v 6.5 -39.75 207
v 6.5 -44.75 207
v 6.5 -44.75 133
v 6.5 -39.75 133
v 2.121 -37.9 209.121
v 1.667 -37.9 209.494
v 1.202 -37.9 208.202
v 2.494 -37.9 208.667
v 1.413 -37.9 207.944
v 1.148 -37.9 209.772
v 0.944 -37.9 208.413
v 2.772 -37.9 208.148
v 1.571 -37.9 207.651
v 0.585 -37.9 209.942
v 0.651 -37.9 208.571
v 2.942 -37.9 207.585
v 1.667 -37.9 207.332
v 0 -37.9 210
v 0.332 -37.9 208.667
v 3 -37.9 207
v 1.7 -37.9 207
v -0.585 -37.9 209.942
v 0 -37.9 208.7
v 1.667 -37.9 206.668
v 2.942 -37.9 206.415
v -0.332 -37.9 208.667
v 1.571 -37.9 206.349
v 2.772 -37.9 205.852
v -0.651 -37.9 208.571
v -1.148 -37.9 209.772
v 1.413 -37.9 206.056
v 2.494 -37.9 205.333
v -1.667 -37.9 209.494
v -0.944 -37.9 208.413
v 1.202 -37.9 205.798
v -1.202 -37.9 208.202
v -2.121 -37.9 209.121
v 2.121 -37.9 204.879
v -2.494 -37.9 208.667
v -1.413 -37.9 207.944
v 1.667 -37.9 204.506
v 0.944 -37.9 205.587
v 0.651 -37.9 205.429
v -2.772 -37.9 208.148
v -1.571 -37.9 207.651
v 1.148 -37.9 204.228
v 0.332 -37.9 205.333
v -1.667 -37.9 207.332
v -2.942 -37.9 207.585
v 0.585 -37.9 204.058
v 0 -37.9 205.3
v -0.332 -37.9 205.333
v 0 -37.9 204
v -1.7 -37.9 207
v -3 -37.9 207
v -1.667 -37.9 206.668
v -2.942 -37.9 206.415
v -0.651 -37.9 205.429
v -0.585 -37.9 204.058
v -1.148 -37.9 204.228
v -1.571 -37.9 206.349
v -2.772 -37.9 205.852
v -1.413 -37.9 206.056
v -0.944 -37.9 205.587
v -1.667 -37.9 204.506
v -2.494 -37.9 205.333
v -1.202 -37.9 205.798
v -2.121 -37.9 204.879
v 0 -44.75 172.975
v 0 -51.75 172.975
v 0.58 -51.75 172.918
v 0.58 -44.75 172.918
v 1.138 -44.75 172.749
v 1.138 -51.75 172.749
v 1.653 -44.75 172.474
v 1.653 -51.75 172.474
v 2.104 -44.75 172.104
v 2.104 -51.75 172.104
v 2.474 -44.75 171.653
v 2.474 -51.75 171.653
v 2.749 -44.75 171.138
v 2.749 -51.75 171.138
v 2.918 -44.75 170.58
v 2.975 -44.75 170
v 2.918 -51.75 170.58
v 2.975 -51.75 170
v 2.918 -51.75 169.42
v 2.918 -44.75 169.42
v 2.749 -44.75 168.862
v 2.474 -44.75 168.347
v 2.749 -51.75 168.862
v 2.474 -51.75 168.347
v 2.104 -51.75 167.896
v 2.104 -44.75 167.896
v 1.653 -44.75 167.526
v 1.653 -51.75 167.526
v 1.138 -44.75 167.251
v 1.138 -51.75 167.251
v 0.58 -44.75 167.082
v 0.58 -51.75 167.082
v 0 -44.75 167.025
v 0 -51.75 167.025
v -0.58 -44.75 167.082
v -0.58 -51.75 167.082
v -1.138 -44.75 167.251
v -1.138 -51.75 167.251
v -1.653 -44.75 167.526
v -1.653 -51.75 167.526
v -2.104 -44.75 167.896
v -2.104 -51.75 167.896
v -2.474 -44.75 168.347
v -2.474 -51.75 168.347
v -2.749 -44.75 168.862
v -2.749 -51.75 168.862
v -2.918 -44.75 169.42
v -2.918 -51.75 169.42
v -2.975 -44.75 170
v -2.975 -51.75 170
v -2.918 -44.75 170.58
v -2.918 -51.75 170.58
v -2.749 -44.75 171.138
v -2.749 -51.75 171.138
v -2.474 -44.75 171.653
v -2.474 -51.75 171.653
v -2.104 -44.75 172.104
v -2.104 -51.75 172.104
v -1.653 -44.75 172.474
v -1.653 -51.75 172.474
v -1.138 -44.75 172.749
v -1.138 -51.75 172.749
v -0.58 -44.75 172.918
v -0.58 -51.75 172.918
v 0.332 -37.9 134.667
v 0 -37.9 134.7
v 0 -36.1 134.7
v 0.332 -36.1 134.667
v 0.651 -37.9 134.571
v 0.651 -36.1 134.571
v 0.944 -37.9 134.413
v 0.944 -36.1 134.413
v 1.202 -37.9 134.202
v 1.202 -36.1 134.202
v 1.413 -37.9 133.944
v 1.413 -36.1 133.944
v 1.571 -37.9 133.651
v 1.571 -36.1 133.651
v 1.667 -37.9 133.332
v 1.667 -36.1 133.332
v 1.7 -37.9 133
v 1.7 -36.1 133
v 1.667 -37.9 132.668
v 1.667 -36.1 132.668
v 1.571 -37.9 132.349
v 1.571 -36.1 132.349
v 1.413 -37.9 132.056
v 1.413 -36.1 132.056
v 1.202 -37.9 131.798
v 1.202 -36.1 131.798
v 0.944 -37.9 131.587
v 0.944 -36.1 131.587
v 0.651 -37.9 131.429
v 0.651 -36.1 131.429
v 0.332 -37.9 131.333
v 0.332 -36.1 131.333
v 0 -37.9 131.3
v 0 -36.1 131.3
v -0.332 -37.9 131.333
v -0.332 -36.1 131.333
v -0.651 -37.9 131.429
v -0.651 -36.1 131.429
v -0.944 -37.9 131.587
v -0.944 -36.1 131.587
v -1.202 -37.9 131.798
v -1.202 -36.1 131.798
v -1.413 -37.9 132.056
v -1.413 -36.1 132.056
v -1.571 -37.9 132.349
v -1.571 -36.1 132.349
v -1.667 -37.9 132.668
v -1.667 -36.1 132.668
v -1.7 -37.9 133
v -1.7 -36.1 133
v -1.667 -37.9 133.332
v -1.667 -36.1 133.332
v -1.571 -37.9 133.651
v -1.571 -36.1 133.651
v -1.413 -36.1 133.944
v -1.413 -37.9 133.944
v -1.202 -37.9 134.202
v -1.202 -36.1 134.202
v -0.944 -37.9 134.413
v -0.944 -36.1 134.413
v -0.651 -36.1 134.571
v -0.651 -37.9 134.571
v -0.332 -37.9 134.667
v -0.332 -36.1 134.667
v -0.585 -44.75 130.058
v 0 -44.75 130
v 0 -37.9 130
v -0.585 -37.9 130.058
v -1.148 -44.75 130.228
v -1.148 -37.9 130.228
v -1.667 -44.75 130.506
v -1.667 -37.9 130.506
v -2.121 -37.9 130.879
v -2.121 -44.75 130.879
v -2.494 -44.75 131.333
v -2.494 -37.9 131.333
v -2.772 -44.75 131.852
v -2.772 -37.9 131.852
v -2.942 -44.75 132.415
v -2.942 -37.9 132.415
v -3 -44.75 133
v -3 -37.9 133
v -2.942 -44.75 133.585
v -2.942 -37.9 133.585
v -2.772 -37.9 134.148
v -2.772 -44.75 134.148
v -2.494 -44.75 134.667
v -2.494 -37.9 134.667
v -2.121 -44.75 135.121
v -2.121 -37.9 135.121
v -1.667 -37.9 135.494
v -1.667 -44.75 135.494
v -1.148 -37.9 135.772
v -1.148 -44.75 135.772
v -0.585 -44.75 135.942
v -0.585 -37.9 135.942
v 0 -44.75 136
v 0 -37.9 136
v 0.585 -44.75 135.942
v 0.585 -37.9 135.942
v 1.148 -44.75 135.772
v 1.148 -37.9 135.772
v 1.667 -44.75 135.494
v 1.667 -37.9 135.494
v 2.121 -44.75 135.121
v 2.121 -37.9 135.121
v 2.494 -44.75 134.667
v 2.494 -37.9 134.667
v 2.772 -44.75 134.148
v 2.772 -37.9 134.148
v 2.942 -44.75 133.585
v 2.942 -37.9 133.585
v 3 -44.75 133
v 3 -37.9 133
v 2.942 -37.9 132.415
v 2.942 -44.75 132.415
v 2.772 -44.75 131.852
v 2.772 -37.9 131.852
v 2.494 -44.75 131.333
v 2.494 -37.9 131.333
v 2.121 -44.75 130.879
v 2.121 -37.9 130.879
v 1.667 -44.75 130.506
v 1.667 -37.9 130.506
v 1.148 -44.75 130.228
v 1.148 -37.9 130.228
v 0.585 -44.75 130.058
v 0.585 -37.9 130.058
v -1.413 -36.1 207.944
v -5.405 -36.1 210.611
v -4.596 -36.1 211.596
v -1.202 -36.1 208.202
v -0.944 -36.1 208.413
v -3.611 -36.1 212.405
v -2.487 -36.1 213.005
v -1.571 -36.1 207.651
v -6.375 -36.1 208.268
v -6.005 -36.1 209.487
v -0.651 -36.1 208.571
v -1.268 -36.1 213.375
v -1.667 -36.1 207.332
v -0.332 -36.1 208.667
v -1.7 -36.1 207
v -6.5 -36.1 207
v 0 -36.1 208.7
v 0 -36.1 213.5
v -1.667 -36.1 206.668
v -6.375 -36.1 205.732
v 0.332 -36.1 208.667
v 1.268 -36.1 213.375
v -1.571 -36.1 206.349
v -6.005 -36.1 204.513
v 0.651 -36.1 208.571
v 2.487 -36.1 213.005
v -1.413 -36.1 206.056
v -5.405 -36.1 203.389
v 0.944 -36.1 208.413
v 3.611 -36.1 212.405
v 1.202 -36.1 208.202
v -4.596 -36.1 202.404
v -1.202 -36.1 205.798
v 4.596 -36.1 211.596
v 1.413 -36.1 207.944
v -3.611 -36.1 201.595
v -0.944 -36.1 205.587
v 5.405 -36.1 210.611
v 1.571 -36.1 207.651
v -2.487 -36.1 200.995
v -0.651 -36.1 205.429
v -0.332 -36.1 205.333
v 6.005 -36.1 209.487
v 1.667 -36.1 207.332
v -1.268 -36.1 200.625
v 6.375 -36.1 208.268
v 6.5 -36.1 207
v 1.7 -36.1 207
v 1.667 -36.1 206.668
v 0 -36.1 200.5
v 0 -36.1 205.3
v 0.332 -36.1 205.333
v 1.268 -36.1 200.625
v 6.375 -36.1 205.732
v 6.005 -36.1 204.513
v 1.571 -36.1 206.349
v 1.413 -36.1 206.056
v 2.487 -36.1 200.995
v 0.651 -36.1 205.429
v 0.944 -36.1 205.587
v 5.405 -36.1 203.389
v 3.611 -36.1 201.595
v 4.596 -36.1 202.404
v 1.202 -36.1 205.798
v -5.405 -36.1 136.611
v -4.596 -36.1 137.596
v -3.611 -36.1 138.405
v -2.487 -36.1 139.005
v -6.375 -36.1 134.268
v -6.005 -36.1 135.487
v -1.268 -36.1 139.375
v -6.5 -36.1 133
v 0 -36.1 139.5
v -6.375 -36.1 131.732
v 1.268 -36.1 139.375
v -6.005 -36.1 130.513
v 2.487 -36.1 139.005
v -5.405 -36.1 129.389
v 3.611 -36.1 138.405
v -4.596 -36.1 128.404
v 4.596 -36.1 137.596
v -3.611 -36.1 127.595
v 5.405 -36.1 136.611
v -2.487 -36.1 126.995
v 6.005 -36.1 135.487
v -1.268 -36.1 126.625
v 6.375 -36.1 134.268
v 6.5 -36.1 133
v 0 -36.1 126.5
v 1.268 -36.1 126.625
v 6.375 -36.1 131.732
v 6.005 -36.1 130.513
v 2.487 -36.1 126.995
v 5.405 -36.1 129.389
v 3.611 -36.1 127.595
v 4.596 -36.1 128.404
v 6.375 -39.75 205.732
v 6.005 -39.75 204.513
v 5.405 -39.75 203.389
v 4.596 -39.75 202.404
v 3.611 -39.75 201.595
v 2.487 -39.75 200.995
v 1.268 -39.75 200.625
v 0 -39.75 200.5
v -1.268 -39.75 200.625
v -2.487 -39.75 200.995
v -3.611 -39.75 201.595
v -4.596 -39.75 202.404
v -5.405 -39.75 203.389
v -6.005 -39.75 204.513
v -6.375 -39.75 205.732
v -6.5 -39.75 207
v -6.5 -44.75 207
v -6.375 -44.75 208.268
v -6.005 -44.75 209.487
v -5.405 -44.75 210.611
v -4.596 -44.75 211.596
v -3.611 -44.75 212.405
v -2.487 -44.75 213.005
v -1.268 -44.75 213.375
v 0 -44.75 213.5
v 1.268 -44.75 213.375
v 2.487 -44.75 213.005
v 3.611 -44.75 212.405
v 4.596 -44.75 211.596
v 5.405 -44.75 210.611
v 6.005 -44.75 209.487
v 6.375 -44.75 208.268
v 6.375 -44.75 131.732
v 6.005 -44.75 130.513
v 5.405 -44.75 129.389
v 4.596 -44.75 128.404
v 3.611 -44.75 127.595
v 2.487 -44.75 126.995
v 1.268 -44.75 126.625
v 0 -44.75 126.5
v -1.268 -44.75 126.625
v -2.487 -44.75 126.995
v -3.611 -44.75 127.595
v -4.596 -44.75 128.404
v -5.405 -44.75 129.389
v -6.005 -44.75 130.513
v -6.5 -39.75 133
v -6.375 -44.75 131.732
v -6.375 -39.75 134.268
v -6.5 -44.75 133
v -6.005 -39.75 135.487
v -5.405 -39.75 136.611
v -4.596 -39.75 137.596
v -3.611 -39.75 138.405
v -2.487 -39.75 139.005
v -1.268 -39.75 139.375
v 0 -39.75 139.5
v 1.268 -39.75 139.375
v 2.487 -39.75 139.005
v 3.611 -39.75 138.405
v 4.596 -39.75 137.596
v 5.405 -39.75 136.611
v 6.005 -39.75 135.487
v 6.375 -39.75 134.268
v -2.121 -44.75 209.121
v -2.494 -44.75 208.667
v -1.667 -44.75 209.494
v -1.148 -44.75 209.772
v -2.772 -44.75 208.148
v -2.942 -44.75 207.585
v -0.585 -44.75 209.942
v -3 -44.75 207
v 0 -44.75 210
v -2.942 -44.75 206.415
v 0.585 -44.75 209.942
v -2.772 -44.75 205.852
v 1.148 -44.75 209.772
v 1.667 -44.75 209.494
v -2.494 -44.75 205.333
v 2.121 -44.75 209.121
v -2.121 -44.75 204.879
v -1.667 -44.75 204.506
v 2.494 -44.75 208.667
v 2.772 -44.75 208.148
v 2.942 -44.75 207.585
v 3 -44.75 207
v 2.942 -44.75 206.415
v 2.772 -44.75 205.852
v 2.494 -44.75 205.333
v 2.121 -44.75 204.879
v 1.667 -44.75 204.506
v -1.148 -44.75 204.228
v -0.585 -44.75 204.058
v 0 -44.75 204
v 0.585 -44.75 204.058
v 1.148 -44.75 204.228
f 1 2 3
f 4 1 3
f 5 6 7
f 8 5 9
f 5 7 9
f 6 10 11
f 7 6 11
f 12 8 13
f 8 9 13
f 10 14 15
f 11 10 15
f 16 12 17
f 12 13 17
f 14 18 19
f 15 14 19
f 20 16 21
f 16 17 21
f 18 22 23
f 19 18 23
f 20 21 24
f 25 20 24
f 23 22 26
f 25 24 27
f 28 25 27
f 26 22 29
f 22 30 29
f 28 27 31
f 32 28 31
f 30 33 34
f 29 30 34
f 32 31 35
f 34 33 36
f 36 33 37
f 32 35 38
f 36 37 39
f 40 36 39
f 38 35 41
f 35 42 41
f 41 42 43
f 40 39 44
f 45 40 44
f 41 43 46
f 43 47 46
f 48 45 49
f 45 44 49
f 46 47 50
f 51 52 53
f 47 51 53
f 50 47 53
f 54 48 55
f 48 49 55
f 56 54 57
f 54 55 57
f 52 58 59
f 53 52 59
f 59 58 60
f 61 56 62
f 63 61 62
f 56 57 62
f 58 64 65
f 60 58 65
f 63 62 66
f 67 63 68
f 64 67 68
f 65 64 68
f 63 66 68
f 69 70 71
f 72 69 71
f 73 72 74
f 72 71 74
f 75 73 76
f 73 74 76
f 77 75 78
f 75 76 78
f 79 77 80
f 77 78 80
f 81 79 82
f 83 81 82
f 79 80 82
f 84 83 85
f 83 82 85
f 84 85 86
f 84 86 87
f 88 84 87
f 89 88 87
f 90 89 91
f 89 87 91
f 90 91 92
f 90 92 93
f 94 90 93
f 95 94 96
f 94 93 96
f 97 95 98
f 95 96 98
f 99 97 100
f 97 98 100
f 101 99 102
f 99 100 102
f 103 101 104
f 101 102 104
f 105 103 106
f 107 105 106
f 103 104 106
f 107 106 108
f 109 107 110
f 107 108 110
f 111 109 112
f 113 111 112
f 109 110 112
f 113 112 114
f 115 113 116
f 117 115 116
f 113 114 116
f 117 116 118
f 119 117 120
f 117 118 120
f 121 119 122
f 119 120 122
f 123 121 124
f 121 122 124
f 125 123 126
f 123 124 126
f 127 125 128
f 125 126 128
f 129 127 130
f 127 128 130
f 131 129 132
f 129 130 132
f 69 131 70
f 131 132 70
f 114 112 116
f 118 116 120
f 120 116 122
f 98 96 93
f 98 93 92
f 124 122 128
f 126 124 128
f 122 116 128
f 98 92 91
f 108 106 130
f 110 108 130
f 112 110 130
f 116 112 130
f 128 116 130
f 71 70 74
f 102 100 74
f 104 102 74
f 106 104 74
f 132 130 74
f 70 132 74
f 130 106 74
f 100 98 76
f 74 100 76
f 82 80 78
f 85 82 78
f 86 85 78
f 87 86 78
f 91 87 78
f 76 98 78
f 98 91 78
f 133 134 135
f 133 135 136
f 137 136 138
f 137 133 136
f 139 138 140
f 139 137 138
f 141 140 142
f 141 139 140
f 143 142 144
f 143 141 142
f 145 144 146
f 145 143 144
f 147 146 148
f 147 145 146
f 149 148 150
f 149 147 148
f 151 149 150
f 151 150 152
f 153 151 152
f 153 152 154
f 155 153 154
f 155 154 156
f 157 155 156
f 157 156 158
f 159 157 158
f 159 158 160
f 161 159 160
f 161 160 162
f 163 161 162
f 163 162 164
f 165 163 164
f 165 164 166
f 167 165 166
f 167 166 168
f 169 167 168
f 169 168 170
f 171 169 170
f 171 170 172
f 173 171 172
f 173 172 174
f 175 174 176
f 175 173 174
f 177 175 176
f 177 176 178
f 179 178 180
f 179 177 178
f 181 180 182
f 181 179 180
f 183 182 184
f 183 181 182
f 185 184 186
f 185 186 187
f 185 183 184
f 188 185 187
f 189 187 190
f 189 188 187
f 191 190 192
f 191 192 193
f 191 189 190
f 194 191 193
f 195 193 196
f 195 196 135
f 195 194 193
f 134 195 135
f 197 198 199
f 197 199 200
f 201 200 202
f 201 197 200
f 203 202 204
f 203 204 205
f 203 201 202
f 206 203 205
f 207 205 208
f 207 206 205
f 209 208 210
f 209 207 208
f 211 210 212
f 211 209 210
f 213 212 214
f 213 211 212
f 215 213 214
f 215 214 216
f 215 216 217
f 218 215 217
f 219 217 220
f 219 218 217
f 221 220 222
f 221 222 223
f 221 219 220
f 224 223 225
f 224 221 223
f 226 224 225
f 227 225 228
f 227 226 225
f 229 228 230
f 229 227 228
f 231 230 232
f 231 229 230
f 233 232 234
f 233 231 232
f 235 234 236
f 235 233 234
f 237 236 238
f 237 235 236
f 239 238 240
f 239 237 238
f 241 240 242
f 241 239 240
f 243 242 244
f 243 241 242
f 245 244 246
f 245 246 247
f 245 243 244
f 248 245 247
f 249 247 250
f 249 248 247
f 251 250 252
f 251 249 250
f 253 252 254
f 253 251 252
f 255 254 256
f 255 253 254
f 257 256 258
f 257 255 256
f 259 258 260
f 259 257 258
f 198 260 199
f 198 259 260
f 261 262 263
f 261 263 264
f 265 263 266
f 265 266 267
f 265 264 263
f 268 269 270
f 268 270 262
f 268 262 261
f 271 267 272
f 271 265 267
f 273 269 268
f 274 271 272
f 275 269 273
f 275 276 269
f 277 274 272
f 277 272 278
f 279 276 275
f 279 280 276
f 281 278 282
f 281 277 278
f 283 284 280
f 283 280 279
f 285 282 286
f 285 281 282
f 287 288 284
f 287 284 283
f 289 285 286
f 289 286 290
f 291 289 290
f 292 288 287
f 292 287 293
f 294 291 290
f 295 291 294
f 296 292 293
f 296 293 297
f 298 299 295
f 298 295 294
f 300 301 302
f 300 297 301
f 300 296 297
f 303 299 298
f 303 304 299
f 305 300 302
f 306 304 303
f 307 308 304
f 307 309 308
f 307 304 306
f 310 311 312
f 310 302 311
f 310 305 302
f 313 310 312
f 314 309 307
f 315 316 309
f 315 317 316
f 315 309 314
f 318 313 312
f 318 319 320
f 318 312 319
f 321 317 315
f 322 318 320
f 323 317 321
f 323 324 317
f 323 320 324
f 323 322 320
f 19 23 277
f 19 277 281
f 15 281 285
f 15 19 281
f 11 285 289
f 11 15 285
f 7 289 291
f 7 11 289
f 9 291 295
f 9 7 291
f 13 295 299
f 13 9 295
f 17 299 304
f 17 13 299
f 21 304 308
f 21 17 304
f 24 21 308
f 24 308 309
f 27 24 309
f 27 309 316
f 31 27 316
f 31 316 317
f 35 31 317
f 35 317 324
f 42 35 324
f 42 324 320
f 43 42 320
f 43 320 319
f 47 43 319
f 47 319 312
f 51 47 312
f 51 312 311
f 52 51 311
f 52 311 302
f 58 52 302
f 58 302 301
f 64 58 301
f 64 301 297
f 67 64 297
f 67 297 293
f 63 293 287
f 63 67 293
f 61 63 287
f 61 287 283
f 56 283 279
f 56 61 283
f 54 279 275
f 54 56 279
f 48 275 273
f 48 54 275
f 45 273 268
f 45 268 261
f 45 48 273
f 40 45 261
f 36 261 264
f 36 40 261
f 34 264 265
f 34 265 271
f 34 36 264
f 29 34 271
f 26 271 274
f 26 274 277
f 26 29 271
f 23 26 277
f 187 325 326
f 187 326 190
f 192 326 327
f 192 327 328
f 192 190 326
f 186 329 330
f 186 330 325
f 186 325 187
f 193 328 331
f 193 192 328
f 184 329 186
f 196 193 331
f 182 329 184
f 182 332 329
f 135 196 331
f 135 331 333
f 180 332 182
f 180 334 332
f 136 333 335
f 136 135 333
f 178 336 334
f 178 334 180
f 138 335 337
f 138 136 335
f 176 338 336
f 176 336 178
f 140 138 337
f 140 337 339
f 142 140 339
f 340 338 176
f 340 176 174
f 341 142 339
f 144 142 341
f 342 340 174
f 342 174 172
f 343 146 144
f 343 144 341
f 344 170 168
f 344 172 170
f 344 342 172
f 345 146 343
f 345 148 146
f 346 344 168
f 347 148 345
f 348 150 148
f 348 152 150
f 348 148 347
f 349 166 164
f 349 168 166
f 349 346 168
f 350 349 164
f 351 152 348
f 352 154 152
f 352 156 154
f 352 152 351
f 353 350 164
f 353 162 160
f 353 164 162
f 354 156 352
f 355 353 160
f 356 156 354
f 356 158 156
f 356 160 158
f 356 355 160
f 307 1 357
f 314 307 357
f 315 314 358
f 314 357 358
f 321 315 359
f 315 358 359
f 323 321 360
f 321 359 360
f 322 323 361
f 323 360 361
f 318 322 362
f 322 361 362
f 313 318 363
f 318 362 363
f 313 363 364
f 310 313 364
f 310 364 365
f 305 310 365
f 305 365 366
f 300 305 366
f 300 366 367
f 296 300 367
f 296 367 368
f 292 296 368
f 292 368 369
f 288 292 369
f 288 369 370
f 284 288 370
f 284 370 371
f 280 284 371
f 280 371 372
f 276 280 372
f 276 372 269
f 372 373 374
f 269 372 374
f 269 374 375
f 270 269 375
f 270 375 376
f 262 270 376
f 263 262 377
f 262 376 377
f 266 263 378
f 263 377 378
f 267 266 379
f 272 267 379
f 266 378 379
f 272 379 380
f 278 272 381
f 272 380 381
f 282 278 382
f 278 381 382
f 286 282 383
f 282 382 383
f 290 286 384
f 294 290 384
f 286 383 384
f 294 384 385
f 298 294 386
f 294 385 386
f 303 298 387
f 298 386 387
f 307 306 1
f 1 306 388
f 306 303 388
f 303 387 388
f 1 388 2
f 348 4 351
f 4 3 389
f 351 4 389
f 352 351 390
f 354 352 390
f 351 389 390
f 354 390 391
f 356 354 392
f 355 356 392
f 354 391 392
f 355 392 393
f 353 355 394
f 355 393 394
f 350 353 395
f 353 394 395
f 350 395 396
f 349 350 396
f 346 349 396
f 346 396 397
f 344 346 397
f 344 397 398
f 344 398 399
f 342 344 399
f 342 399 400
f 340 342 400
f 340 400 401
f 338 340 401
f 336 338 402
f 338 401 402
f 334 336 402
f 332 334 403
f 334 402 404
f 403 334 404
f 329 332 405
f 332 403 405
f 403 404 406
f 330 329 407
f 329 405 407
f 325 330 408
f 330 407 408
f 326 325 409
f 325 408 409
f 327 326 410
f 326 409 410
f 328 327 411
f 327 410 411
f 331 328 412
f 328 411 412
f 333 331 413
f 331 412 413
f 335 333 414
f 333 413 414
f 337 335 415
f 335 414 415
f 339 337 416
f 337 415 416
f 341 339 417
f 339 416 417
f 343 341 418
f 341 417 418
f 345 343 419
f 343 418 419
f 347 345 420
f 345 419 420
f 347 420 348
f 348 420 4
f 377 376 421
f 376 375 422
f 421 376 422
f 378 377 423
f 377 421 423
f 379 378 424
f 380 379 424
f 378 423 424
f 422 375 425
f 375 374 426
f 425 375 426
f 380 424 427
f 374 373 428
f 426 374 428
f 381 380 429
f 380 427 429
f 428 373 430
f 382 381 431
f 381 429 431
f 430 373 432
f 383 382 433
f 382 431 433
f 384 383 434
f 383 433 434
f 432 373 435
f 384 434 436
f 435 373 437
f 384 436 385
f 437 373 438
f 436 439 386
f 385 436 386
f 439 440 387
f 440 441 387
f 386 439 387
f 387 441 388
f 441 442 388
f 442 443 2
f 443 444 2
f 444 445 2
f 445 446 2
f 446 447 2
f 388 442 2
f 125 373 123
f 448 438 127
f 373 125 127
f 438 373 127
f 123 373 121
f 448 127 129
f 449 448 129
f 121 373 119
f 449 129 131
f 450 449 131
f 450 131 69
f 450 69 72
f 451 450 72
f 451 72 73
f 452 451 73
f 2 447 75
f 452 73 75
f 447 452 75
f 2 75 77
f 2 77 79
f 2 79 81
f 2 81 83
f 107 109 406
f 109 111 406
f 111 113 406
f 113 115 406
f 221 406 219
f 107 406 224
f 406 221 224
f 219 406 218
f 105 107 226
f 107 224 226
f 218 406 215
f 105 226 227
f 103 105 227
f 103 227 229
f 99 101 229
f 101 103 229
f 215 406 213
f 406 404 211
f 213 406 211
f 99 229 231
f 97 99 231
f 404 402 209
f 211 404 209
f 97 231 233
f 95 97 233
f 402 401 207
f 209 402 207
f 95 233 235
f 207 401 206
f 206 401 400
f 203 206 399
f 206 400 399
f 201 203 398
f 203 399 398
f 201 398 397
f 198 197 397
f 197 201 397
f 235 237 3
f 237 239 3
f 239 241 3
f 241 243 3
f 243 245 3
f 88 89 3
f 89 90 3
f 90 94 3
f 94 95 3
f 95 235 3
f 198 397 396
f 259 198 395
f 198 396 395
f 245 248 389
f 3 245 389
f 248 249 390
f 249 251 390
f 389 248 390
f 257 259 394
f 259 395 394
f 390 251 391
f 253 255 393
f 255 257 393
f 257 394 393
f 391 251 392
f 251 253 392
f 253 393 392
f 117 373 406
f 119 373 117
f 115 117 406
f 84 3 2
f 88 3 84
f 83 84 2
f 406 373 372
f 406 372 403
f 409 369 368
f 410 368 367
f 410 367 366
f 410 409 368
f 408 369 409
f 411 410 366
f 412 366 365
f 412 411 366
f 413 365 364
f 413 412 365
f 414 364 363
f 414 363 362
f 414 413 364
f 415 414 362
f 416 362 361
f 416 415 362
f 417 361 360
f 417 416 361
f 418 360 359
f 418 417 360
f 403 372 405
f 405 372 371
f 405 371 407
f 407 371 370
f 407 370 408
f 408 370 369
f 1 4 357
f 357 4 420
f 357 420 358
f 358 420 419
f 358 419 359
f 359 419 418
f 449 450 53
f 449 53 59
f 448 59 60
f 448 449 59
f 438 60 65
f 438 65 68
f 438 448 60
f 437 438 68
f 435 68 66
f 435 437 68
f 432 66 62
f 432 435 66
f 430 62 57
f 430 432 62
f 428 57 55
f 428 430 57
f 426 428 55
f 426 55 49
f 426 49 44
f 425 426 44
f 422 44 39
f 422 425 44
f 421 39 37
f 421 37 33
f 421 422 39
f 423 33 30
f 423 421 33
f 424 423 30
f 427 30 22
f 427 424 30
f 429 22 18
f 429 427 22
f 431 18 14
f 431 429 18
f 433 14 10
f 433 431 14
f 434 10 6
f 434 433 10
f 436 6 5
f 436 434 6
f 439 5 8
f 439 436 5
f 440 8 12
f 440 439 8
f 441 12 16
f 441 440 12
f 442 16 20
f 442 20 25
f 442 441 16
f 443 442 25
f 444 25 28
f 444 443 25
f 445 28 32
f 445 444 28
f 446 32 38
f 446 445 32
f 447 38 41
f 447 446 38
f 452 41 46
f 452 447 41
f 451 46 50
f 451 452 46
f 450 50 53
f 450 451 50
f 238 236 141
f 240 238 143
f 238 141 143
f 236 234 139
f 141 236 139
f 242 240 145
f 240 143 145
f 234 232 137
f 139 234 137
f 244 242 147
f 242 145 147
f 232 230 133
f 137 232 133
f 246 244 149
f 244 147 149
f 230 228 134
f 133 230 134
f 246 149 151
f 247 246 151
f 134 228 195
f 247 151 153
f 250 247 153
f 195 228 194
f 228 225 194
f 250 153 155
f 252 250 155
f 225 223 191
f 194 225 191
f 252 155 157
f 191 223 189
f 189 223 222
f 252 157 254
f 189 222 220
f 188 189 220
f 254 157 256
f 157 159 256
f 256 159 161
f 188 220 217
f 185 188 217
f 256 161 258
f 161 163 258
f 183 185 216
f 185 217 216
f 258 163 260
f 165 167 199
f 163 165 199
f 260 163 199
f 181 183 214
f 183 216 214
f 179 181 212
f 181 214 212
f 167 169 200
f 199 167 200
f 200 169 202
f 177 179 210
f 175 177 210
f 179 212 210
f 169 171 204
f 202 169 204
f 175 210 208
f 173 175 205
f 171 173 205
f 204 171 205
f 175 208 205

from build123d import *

# Parameters (mm, degrees)
BARRA_START       = -44.75
SK_BARRA_W        = 13
SK_BARRA_H        = 74
BARRA_DEPTH       = 5
EXTREMOS_START    = -44.75
SK_EXTREMOS_R     = 6.5
EXTREMOS_DEPTH    = 8.65
PERNO_696_START   = -51.75
SK_PERNO_696_R    = 2.975
PERNO_696_DEPTH   = 7
PASANTES_M3_START = -44.75
SK_PASANTES_M3_R  = 1.7
PASANTES_M3_DEPTH = 8.65
CAJAS_M3_START    = -44.75
SK_CAJAS_M3_R     = 3
CAJAS_M3_DEPTH    = 6.85


with BuildPart() as part:
    # Sk_Barra → Barra (new body)
    with BuildSketch(Plane(origin=(0, 0, 0), x_dir=(1, 0, 0), z_dir=(0, 1, 0)).offset(BARRA_START)):
        with Locations((0, -170)):
            Rectangle(SK_BARRA_W, SK_BARRA_H)
    extrude(amount=BARRA_DEPTH)

    # Sk_Extremos → Extremos (add)
    with BuildSketch(Plane(origin=(0, 0, 0), x_dir=(1, 0, 0), z_dir=(0, 1, 0)).offset(EXTREMOS_START)):
        with Locations((0, -133)):
            Circle(SK_EXTREMOS_R)
        with Locations((0, -207)):
            Circle(SK_EXTREMOS_R)
    extrude(amount=EXTREMOS_DEPTH)

    # Sk_Perno_696 → Perno_696 (add)
    with BuildSketch(Plane(origin=(0, 0, 0), x_dir=(1, 0, 0), z_dir=(0, 1, 0)).offset(PERNO_696_START)):
        with Locations(Location((0, -170, 0), (0, 0, 270))):
            Circle(SK_PERNO_696_R)
    extrude(amount=PERNO_696_DEPTH)

    # Sk_Pasantes_M3 → Pasantes_M3 (cut)
    with BuildSketch(Plane(origin=(0, 0, 0), x_dir=(1, 0, 0), z_dir=(0, 1, 0)).offset(PASANTES_M3_START)):
        with Locations(Location((0, -133, 0), (0, 0, 270))):
            Circle(SK_PASANTES_M3_R)
        with Locations(Location((0, -207, 0), (0, 0, 270))):
            Circle(SK_PASANTES_M3_R)
    extrude(amount=PASANTES_M3_DEPTH, mode=Mode.SUBTRACT)

    # Sk_Cajas_M3 → Cajas_M3 (cut)
    with BuildSketch(Plane(origin=(0, 0, 0), x_dir=(1, 0, 0), z_dir=(0, 1, 0)).offset(CAJAS_M3_START)):
        with Locations(Location((0, -133, 0), (0, 0, 90))):
            Circle(SK_CAJAS_M3_R)
        with Locations(Location((0, -207, 0), (0, 0, 90))):
            Circle(SK_CAJAS_M3_R)
    extrude(amount=CAJAS_M3_DEPTH, mode=Mode.SUBTRACT)


solid = part.part
